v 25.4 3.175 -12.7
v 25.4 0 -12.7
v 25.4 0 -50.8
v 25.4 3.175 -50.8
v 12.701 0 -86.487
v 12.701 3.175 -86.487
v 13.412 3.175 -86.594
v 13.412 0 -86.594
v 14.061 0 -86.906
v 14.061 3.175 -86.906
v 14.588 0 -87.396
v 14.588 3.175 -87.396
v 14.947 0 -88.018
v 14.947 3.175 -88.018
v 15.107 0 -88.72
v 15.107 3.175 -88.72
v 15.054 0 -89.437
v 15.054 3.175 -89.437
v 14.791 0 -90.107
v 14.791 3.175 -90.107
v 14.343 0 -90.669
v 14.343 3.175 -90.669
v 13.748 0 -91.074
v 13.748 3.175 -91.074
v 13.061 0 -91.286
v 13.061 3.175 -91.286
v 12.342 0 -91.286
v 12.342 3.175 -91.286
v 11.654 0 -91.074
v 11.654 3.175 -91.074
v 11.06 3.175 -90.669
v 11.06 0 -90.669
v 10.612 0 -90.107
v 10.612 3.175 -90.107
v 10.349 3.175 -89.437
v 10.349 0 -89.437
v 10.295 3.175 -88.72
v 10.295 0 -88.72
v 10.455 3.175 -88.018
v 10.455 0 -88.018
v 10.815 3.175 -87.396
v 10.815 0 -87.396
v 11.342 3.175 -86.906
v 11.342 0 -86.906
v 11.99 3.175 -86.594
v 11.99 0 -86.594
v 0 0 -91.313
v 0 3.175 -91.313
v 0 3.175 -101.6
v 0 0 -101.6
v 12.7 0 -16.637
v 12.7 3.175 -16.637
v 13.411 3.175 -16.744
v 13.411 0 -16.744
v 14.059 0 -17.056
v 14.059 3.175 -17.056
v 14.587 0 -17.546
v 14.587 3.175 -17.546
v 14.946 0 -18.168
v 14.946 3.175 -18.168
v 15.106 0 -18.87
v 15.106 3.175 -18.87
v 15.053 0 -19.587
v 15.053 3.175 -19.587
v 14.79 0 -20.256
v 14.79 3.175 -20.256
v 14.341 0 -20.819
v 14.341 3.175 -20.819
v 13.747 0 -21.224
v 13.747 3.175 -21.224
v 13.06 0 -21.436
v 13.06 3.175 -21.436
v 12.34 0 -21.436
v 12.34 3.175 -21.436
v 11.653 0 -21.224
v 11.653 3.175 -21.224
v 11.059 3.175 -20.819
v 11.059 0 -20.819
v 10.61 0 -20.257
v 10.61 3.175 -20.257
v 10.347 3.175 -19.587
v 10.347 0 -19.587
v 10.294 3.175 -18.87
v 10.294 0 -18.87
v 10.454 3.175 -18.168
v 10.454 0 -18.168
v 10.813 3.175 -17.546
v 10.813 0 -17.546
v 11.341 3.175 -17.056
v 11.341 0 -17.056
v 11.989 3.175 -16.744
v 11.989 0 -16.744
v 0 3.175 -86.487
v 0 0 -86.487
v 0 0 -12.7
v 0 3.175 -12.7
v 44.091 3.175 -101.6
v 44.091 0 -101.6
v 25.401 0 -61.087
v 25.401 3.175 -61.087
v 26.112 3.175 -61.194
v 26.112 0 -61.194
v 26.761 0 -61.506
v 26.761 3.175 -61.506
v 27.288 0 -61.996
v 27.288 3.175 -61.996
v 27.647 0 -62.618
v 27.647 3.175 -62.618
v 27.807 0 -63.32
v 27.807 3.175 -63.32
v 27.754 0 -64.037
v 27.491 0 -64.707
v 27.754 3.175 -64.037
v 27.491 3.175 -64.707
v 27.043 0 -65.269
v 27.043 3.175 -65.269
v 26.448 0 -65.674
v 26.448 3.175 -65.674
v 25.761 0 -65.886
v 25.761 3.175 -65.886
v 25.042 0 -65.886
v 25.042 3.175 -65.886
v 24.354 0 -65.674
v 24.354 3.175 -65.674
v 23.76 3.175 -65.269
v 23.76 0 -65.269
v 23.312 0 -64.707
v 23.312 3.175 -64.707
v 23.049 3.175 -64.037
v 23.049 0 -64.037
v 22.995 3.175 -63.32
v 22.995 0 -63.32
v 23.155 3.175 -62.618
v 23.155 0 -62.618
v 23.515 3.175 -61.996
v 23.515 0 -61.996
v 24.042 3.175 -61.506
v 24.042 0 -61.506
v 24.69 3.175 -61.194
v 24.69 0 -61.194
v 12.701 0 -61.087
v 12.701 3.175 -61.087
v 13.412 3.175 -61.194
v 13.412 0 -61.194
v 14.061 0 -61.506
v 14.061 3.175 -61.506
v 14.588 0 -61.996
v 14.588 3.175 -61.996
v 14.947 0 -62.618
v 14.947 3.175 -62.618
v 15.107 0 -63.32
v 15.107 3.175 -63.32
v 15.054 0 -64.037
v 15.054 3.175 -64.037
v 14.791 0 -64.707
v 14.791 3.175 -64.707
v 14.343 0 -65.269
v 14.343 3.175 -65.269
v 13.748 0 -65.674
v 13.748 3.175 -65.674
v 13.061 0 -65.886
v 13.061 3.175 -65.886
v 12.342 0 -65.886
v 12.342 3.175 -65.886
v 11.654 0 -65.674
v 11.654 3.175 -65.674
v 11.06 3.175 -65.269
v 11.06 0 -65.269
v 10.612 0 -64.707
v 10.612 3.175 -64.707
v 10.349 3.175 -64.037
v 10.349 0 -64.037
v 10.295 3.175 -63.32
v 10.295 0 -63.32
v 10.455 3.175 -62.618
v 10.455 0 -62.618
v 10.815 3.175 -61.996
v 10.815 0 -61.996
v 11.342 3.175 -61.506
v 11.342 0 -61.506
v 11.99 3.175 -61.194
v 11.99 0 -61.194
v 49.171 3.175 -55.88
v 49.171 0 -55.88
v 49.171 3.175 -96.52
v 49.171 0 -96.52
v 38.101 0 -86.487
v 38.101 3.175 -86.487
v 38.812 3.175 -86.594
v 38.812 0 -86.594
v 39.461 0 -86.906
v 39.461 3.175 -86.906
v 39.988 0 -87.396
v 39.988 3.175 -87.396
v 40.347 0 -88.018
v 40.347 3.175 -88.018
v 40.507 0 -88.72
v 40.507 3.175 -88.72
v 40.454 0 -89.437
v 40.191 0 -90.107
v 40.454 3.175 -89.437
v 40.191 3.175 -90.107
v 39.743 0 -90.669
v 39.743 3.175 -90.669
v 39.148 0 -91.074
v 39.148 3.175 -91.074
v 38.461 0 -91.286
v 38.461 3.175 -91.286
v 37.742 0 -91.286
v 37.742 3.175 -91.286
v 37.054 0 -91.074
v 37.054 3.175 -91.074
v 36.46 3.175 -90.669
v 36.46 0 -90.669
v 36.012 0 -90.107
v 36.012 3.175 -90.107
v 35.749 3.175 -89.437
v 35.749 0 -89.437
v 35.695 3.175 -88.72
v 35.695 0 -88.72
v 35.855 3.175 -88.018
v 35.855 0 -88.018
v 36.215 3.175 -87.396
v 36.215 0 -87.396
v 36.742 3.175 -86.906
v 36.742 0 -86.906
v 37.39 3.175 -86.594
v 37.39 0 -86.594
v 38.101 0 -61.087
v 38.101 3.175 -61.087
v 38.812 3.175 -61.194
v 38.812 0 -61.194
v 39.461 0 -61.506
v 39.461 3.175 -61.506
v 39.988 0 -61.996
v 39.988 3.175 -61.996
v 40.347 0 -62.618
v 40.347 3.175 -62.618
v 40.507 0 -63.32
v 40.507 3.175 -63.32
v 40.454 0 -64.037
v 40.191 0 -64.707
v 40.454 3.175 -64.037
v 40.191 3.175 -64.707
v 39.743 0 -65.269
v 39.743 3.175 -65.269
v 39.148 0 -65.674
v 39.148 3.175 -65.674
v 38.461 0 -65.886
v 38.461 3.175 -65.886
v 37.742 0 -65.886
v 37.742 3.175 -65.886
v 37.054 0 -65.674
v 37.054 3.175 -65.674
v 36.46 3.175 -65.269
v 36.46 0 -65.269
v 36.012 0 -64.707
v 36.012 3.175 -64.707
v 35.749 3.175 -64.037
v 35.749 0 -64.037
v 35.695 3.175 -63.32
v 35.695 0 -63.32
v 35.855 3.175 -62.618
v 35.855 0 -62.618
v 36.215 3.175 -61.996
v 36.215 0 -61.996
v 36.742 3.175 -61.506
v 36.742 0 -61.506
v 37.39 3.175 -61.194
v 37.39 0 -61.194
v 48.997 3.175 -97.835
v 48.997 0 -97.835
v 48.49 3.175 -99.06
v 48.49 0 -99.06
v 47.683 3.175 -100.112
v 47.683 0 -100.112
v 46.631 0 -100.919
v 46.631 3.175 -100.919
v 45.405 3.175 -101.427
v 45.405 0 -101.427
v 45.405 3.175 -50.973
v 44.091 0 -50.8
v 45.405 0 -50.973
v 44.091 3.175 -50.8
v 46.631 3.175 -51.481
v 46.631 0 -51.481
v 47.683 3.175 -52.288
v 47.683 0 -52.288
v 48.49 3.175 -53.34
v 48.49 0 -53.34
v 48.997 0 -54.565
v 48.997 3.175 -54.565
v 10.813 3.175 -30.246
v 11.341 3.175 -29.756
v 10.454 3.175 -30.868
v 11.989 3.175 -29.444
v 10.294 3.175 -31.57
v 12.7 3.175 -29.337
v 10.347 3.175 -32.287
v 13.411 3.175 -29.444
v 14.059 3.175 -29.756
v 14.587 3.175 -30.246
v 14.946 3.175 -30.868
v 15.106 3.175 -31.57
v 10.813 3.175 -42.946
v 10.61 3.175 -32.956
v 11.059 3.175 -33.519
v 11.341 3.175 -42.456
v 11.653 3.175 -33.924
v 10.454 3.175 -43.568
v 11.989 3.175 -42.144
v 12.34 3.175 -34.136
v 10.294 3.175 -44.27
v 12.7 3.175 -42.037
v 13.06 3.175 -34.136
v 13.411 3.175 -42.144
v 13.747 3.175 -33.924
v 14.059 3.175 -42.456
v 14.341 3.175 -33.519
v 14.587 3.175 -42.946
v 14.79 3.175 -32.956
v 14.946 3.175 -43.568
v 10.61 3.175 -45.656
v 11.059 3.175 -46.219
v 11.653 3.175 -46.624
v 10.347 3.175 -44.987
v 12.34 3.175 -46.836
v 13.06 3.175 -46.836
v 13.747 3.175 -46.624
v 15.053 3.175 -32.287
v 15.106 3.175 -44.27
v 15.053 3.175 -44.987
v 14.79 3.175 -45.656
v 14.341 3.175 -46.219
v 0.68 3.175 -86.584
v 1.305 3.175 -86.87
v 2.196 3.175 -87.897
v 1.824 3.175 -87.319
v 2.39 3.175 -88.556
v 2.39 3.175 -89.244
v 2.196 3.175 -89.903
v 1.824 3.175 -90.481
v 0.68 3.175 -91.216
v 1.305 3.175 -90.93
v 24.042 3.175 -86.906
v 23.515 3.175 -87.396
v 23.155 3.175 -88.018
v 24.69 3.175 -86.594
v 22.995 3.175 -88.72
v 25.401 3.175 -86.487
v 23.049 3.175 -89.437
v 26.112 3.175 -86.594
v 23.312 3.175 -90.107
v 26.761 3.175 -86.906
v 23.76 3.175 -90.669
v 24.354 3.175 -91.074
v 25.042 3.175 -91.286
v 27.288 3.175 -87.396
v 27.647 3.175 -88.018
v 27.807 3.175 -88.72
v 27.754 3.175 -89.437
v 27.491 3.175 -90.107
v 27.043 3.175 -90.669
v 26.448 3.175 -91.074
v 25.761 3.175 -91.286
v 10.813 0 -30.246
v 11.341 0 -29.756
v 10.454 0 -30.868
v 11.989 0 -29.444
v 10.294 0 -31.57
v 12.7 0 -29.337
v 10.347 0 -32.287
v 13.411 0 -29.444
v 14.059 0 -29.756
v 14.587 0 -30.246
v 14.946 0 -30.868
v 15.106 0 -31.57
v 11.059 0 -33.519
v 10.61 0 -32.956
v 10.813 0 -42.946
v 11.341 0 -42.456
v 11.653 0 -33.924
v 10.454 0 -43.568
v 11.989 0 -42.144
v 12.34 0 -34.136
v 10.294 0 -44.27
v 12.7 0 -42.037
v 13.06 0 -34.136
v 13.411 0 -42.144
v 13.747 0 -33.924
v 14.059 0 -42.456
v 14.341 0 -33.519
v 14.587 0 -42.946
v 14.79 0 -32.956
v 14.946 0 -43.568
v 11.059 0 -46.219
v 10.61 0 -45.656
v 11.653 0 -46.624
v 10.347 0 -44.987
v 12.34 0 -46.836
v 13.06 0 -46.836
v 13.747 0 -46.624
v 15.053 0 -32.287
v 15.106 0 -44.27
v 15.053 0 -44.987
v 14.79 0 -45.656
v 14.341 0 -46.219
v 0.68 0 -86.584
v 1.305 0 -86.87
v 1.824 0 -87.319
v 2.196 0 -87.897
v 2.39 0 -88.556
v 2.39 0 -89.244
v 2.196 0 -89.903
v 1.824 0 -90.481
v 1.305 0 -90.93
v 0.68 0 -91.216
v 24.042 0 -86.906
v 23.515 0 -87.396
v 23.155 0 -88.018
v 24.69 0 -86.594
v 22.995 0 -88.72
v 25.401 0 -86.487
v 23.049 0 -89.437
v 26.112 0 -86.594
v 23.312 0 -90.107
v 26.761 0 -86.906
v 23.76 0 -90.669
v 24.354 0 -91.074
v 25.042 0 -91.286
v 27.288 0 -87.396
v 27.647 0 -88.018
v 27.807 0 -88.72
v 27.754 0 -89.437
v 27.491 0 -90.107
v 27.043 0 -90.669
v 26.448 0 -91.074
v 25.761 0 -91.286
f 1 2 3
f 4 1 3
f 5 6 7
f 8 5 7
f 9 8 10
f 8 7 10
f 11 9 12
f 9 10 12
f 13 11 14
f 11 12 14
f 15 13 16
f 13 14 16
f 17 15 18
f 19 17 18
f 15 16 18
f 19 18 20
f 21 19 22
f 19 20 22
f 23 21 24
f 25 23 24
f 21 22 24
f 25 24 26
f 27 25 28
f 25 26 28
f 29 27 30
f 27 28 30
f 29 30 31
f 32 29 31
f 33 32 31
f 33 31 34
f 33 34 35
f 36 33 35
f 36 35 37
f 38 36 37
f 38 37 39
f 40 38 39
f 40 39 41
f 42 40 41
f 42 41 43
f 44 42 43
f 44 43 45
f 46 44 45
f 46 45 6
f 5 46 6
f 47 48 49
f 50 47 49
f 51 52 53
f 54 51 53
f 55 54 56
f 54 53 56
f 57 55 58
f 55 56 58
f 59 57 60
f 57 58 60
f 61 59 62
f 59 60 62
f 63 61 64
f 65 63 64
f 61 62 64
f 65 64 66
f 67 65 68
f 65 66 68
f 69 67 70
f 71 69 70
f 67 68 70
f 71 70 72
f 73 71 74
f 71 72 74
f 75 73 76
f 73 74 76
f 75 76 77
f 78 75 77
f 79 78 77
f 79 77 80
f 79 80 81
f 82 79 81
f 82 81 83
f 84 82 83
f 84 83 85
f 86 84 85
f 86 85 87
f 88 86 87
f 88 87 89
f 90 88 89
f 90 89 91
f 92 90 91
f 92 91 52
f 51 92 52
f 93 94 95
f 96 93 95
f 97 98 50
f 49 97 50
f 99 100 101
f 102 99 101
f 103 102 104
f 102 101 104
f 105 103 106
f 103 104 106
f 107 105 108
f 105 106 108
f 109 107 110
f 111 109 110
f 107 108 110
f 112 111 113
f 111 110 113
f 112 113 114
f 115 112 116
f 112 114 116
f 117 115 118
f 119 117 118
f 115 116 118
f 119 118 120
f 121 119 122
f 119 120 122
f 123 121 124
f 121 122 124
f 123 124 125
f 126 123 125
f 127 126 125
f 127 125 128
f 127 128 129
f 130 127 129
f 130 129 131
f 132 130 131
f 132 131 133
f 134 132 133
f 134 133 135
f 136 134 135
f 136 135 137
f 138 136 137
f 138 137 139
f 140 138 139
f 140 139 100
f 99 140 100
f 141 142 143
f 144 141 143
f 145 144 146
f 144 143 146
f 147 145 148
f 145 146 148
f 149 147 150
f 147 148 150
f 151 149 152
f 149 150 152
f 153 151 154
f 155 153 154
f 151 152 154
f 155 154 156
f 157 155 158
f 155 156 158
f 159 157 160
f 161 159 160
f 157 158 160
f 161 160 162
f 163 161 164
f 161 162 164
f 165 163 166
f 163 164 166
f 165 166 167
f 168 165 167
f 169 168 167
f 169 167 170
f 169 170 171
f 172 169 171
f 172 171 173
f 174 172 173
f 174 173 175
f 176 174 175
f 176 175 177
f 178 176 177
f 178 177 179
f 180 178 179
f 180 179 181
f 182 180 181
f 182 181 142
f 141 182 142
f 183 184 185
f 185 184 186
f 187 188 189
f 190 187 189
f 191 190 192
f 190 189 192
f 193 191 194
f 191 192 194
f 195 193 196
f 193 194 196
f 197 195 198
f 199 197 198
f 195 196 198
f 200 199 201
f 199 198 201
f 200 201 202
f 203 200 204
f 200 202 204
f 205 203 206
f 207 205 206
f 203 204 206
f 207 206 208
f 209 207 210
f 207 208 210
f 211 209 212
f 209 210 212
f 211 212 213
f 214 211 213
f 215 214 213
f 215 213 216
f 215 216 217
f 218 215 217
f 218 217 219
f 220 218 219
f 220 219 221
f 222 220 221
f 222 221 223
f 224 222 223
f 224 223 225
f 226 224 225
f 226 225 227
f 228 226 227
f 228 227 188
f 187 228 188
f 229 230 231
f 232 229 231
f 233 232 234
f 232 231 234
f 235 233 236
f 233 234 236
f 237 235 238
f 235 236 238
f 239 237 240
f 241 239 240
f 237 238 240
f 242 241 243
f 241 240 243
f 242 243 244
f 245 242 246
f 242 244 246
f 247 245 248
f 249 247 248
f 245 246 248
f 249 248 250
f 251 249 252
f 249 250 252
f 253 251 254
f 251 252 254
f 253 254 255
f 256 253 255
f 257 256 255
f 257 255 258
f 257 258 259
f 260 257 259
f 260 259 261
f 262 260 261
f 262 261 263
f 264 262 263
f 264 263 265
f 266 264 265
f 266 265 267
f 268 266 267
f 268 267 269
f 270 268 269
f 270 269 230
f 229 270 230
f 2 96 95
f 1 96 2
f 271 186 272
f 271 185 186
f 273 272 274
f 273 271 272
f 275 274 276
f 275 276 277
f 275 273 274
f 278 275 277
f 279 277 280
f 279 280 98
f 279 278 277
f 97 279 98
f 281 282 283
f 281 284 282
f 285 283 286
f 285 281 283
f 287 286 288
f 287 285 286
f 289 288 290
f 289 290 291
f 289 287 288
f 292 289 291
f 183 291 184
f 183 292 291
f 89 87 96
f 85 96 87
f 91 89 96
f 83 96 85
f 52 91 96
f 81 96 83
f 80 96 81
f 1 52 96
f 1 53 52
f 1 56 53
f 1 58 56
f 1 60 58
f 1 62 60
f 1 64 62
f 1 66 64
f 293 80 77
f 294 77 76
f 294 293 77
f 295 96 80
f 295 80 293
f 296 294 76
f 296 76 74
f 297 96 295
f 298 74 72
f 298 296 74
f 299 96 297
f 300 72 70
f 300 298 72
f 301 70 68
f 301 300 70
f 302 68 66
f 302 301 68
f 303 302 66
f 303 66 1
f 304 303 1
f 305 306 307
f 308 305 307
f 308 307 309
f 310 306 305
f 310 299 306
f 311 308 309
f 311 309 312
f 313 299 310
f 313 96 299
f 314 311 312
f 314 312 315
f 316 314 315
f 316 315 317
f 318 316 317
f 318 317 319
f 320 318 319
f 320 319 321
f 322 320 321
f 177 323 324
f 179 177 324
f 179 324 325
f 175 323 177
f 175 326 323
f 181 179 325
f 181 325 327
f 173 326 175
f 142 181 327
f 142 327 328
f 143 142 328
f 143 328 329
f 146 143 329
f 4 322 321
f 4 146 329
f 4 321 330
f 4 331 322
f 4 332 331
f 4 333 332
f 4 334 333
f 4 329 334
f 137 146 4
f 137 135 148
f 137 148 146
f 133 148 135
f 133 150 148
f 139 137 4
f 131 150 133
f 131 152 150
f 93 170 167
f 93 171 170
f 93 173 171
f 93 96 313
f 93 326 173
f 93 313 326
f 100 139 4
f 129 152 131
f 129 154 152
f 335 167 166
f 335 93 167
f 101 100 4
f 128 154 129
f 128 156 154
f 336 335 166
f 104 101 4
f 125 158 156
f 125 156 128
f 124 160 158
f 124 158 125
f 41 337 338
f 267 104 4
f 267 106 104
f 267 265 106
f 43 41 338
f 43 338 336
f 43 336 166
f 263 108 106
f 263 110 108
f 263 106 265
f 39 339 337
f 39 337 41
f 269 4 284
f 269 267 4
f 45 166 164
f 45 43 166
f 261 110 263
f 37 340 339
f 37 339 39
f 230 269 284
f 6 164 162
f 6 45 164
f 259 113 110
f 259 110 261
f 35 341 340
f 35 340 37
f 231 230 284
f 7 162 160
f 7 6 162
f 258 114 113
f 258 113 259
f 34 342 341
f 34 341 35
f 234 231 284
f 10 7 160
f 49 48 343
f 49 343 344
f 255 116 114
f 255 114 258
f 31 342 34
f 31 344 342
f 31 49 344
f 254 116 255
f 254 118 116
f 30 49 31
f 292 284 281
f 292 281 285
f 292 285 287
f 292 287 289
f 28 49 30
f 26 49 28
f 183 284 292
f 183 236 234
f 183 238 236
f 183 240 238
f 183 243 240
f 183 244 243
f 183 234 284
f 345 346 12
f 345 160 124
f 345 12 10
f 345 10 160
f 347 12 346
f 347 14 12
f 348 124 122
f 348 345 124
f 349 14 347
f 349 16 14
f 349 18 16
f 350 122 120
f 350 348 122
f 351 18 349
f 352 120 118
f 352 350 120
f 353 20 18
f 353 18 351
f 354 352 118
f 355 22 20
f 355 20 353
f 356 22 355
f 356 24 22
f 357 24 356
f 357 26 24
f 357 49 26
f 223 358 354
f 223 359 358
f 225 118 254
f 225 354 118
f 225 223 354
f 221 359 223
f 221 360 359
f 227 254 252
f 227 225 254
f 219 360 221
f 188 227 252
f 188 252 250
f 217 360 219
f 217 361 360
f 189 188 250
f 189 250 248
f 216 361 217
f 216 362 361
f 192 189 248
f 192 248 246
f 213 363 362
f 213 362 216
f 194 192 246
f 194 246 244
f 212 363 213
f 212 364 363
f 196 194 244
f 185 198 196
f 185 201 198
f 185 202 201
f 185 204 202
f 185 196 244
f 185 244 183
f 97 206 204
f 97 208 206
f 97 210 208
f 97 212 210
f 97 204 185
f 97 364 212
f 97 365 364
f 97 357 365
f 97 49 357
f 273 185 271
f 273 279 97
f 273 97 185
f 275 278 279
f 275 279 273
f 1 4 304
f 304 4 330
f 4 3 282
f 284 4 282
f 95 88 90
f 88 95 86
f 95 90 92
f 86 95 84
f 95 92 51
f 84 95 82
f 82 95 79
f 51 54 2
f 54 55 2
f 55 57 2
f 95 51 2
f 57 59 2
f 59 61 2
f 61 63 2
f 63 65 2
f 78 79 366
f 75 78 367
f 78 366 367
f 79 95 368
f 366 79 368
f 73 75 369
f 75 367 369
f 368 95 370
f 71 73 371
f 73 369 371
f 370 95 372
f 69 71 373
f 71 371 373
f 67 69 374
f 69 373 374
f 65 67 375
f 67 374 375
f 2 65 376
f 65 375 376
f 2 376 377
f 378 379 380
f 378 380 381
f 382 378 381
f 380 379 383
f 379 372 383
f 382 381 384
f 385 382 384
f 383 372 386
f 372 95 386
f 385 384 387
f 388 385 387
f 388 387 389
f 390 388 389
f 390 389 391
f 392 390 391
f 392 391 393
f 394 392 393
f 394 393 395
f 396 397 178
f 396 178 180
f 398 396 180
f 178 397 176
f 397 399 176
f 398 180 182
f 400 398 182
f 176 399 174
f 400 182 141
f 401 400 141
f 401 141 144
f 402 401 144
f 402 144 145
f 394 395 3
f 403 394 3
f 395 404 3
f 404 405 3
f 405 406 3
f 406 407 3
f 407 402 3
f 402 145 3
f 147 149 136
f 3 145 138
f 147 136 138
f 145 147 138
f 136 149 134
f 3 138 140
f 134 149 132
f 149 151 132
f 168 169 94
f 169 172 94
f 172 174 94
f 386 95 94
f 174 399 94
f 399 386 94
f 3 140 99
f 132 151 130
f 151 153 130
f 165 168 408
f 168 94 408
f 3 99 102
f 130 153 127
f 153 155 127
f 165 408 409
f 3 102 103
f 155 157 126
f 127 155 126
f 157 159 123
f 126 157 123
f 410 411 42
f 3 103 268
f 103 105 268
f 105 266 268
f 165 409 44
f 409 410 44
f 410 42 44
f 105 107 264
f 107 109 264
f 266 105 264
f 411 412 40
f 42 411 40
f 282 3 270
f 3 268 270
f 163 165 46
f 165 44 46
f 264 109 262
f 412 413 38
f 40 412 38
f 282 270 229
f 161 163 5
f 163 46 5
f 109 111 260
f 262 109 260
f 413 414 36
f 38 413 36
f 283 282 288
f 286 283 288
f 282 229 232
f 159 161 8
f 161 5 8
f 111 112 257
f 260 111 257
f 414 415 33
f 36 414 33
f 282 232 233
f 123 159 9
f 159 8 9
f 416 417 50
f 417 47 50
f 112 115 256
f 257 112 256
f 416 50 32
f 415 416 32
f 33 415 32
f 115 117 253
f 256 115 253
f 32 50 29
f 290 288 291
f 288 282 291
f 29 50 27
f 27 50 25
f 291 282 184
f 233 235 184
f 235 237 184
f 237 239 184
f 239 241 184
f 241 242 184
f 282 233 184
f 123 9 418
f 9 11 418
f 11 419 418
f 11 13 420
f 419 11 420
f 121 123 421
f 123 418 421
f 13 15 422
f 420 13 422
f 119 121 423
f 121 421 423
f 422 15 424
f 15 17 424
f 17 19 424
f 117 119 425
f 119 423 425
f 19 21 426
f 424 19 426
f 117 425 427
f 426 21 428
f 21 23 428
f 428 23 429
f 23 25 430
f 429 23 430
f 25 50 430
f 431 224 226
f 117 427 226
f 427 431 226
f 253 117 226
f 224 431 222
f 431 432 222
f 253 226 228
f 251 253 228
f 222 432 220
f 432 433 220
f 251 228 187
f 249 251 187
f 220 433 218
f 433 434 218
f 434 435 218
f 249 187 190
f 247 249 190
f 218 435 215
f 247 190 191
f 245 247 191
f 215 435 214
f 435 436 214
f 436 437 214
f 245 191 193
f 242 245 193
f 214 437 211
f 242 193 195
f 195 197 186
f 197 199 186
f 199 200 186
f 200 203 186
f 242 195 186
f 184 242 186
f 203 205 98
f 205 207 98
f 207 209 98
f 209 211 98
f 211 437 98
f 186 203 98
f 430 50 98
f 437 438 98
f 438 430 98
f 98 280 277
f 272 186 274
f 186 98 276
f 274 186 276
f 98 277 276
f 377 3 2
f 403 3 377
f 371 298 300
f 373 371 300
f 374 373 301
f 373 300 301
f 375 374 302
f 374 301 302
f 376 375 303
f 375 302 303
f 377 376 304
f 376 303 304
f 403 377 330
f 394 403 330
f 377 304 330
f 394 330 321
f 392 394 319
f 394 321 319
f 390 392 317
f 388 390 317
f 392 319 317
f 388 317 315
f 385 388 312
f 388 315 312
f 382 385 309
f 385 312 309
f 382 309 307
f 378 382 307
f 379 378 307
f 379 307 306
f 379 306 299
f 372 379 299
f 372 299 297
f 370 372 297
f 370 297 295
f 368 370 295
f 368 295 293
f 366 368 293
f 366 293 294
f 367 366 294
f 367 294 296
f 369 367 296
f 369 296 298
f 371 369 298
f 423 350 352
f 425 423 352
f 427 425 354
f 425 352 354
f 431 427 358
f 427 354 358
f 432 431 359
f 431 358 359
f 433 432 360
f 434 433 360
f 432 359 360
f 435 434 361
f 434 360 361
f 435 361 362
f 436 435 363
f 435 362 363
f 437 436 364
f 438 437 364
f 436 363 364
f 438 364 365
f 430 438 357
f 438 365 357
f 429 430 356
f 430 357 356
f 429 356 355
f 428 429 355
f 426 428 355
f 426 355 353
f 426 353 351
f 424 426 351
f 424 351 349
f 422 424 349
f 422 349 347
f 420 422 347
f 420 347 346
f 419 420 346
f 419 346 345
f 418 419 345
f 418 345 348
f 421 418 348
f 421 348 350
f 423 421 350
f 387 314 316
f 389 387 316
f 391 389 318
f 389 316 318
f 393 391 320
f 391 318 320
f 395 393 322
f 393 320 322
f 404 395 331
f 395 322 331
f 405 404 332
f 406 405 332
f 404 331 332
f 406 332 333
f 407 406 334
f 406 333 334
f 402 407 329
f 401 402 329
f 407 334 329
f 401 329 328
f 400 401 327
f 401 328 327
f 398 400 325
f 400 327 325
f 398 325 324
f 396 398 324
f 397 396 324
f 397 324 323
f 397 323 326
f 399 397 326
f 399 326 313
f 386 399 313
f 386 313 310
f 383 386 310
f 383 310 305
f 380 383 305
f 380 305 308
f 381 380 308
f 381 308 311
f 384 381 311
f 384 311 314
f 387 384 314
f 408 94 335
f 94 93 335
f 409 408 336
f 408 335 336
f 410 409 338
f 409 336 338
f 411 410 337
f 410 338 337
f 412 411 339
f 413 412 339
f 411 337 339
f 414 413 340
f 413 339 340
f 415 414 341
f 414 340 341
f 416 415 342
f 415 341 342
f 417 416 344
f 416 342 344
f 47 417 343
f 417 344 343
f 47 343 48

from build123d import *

# Parameters (mm, degrees)
BOSS_EXTRUDE1_DEPTH = 3.175
FILLET1_R           = 5.08
SKETCH2_R           = 2.413
SKETCH2_W           = 25.4
SKETCH2_H           = 12.7
CUT_EXTRUDE1_DEPTH  = 113.917603541
SKETCH3_W           = 27.94
SKETCH3_H           = 50.8
CUT_EXTRUDE2_DEPTH  = 113.917603541


with BuildPart() as part:
    # Sketch1 → Boss-Extrude1 (new body)
    with BuildSketch(Plane(origin=(0, 0, 0), x_dir=(1, 0, 0), z_dir=(0, 1, 0))):
        Polygon((25.4, 50.8), (49.170566038, 50.8), (49.170566038, 101.6), (-27.029433962, 101.6), (-27.029433962, 50.8), (0, 50.8), (0, 0), (25.4, 0), align=None)
    extrude(amount=BOSS_EXTRUDE1_DEPTH)

    # Fillet1
    fillet1_edges = [part.edges().sort_by_distance(p)[0] for p in [
        (-27.029433962, 1.5875, -50.8),
        (-27.029433962, 1.5875, -101.6),
        (49.170566038, 1.5875, -101.6),
        (49.170566038, 1.5875, -50.8),
        (25.4, 1.5875, 0),
        (0, 1.5875, 0),
    ]]
    fillet(fillet1_edges, radius=FILLET1_R)

    # Sketch2 → Cut-Extrude1 (cut, through all)
    with BuildSketch(Plane(origin=(0, 3.175, 0), x_dir=(1, 0, 0), z_dir=(0, 1, 0))):
        with Locations(Location((12.7, 19.05, 0), (0, 0, 270))):
            Circle(SKETCH2_R)
        with Locations(Location((12.7, 31.75, 0), (0, 0, 270))):
            Circle(SKETCH2_R)
        with Locations(Location((12.7, 44.45, 0), (0, 0, 270))):
            Circle(SKETCH2_R)
        with Locations(Location((-12.698753962, 88.9, 0), (0, 0, 270))):
            Circle(SKETCH2_R)
        with Locations(Location((0.001246038, 88.9, 0), (0, 0, 270))):
            Circle(SKETCH2_R)
        with Locations(Location((12.701246038, 88.9, 0), (0, 0, 270))):
            Circle(SKETCH2_R)
        with Locations(Location((25.401246038, 88.9, 0), (0, 0, 270))):
            Circle(SKETCH2_R)
        with Locations(Location((38.101246038, 88.9, 0), (0, 0, 270))):
            Circle(SKETCH2_R)
        with Locations(Location((12.701246038, 63.5, 0), (0, 0, 270))):
            Circle(SKETCH2_R)
        with Locations(Location((25.401246038, 63.5, 0), (0, 0, 270))):
            Circle(SKETCH2_R)
        with Locations(Location((38.101246038, 63.5, 0), (0, 0, 270))):
            Circle(SKETCH2_R)
        with Locations((12.7, 6.35)):
            Rectangle(SKETCH2_W, SKETCH2_H)
    extrude(amount=-CUT_EXTRUDE1_DEPTH, mode=Mode.SUBTRACT)

    # Sketch3 → Cut-Extrude2 (cut, through all)
    with BuildSketch(Plane(origin=(0, 3.175, 0), x_dir=(1, 0, 0), z_dir=(0, 1, 0))):
        with Locations((-13.97, 76.2)):
            Rectangle(SKETCH3_W, SKETCH3_H)
    extrude(amount=-CUT_EXTRUDE2_DEPTH, mode=Mode.SUBTRACT)


solid = part.part
